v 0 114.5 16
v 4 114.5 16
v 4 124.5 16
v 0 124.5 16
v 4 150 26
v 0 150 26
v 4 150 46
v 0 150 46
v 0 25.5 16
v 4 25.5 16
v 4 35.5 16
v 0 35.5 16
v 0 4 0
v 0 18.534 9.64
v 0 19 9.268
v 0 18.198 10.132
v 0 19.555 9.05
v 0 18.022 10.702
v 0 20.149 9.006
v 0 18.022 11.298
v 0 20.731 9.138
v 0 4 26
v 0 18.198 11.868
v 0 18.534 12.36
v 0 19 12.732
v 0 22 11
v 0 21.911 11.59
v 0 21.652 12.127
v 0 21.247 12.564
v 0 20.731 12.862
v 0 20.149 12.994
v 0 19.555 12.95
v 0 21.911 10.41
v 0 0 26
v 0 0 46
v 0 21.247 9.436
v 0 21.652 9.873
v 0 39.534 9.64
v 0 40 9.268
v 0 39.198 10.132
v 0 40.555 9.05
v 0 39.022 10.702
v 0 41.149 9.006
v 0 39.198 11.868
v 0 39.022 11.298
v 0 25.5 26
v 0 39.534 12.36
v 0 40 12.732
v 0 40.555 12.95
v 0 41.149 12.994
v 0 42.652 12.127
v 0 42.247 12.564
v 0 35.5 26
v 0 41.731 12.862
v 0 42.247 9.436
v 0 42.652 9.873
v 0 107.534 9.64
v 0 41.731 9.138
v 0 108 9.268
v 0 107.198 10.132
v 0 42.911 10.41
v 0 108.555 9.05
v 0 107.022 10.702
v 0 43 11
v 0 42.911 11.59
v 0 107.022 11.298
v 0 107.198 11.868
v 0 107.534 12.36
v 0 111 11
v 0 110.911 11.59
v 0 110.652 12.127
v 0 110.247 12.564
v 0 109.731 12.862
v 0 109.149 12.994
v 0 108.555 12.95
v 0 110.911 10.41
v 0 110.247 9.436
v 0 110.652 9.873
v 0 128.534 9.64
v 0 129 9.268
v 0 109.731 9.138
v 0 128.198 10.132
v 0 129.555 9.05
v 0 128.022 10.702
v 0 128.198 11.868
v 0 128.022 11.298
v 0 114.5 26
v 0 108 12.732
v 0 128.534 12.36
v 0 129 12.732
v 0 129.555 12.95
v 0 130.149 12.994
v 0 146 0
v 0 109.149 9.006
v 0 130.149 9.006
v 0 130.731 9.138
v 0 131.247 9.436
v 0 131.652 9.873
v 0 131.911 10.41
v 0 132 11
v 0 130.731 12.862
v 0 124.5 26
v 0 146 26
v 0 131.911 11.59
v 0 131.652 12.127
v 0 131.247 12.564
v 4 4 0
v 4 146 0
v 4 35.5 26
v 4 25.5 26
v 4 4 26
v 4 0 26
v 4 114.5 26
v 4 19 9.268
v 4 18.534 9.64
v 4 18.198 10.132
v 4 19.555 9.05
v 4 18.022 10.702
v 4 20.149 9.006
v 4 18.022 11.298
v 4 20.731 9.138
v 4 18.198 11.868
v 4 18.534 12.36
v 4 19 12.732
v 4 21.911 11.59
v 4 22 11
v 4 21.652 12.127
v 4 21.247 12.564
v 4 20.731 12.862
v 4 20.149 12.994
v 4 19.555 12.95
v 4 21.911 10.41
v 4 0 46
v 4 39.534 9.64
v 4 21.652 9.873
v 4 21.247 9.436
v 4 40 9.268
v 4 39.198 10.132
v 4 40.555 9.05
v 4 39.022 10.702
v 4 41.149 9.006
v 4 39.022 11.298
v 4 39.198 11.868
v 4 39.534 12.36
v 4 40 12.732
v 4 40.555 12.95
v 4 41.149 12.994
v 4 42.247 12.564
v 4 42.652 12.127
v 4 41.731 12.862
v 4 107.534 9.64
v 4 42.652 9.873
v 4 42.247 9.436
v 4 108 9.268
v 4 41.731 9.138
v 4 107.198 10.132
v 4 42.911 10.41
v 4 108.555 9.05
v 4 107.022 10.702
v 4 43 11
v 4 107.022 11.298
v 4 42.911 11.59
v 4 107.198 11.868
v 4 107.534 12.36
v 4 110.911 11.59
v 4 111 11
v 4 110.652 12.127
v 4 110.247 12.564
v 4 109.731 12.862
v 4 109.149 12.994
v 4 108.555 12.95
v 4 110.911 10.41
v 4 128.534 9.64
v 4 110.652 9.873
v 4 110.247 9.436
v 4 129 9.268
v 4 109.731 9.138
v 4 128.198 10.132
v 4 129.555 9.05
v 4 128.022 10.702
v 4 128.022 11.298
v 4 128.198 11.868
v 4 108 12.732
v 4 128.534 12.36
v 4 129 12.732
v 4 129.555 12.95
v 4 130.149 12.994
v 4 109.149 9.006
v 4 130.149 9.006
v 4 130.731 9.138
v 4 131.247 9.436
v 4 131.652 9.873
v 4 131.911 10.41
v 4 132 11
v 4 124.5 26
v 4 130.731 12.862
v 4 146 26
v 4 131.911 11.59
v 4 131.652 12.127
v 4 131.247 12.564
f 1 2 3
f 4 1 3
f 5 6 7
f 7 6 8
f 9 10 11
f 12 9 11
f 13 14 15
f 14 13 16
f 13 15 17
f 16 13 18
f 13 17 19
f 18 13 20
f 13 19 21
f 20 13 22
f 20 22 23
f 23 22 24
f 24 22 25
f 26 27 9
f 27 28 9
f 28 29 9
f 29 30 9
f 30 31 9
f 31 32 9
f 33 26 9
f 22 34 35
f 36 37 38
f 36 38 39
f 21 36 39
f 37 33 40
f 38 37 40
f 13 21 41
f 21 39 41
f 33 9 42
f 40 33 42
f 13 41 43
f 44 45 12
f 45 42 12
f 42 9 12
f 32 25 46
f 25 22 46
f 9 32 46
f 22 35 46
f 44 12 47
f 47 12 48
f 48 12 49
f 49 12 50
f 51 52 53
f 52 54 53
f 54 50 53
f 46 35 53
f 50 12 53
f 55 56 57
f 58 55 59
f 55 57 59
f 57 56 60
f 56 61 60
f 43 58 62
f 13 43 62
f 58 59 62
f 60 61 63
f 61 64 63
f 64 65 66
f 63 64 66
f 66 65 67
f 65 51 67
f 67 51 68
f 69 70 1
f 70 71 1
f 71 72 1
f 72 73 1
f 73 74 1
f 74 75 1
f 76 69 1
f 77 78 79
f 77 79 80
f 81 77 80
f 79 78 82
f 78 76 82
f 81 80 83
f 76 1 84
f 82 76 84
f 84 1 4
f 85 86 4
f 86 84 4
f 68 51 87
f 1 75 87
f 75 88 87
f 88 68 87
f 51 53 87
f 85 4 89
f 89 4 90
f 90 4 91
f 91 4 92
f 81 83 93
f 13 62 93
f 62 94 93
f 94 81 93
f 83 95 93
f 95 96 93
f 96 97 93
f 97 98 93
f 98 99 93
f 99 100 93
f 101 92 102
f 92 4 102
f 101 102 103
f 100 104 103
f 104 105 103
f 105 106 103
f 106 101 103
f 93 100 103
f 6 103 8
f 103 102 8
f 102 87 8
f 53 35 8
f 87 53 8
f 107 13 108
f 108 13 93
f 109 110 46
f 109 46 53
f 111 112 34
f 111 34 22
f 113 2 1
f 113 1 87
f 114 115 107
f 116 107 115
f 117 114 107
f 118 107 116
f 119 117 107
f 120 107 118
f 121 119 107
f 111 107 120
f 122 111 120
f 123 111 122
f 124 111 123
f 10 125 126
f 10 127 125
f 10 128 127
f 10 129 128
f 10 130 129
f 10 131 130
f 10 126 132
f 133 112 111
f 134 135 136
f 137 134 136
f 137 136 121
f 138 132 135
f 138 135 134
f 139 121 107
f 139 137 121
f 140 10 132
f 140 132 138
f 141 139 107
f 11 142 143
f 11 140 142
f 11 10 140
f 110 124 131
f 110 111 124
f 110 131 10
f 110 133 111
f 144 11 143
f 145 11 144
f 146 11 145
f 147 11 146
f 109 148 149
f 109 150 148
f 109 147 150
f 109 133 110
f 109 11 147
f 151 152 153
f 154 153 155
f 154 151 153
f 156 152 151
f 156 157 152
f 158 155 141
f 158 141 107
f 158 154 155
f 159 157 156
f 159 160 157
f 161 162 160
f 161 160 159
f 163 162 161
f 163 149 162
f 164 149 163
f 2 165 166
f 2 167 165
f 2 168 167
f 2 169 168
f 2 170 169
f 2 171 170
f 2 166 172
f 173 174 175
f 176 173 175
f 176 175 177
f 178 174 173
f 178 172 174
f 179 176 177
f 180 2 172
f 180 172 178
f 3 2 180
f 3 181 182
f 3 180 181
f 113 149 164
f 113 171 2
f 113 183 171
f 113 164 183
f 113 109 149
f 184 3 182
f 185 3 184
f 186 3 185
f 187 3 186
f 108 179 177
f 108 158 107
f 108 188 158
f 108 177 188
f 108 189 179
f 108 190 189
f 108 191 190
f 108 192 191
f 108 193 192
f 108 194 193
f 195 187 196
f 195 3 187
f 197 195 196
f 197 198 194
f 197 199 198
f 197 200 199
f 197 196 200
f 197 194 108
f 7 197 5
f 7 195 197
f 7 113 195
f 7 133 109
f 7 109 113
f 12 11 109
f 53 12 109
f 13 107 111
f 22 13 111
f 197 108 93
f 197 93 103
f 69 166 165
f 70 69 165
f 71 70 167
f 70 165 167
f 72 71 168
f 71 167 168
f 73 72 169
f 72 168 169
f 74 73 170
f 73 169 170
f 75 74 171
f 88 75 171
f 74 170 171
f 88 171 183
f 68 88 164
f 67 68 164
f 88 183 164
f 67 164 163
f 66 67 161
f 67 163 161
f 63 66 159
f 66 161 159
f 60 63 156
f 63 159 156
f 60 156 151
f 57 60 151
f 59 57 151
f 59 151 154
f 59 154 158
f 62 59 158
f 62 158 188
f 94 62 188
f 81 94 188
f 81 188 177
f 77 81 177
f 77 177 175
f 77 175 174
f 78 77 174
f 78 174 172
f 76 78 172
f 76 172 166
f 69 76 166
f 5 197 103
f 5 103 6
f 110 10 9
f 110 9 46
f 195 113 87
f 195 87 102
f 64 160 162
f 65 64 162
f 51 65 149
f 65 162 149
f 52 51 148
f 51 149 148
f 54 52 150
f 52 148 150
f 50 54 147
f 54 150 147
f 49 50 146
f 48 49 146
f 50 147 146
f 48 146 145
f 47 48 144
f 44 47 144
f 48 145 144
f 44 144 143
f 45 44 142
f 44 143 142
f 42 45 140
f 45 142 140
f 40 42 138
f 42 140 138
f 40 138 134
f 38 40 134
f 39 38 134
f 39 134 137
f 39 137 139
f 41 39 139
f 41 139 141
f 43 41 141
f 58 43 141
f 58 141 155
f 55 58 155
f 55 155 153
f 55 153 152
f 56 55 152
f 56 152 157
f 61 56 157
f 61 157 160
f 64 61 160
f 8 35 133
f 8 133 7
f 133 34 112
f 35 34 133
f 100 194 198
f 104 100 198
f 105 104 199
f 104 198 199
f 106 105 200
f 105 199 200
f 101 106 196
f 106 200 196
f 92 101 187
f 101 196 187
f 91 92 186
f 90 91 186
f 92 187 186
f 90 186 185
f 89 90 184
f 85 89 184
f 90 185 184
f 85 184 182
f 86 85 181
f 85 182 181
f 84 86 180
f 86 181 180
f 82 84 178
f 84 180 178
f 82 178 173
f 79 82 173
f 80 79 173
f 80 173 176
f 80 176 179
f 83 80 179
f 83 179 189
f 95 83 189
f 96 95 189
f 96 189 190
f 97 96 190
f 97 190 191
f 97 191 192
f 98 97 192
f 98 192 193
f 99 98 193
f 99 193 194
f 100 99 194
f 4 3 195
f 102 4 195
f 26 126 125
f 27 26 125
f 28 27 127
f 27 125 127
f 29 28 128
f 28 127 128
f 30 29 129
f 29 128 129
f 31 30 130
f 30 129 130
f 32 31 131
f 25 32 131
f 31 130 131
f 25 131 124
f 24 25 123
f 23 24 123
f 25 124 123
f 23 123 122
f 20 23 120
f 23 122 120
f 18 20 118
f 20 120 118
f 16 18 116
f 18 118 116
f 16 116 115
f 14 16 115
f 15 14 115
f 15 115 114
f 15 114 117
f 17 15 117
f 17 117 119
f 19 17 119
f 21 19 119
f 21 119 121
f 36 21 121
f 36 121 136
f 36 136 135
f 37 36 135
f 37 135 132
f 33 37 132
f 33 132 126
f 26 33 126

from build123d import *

# Parameters (mm, degrees)
SKETCH_W        = 150
SKETCH_H        = 46
PAD_DEPTH       = 4
SKETCH001_W     = 4
SKETCH001_H     = 26
POCKET_DEPTH    = 5
SKETCH002_R     = 2
SKETCH002_W     = 10
SKETCH002_H     = 10
POCKET001_DEPTH = 5


with BuildPart() as part:
    # Sketch → Pad (new body)
    with BuildSketch(Plane.YZ):
        with Locations((75, 23)):
            Rectangle(SKETCH_W, SKETCH_H)
    extrude(amount=PAD_DEPTH)

    # Sketch001 (on Face6 of Pad) → Pocket (cut)
    with BuildSketch(Plane.YZ.offset(4)):
        with Locations((2, 13)):
            Rectangle(SKETCH001_W, SKETCH001_H)
        with Locations((148, 13)):
            Rectangle(SKETCH001_W, SKETCH001_H)
    extrude(amount=-POCKET_DEPTH, mode=Mode.SUBTRACT)

    # Sketch002 (on Face4 of Pocket) → Pocket001 (cut)
    with BuildSketch(Plane.YZ.offset(4)):
        with Locations((20, 11)):
            Circle(SKETCH002_R)
        with Locations((41, 11)):
            Circle(SKETCH002_R)
        with Locations((109, 11)):
            Circle(SKETCH002_R)
        with Locations((130, 11)):
            Circle(SKETCH002_R)
        with Locations((30.5, 21)):
            Rectangle(SKETCH002_W, SKETCH002_H)
        with Locations((119.5, 21)):
            Rectangle(SKETCH002_W, SKETCH002_H)
    extrude(amount=-POCKET001_DEPTH, mode=Mode.SUBTRACT)


solid = part.part
